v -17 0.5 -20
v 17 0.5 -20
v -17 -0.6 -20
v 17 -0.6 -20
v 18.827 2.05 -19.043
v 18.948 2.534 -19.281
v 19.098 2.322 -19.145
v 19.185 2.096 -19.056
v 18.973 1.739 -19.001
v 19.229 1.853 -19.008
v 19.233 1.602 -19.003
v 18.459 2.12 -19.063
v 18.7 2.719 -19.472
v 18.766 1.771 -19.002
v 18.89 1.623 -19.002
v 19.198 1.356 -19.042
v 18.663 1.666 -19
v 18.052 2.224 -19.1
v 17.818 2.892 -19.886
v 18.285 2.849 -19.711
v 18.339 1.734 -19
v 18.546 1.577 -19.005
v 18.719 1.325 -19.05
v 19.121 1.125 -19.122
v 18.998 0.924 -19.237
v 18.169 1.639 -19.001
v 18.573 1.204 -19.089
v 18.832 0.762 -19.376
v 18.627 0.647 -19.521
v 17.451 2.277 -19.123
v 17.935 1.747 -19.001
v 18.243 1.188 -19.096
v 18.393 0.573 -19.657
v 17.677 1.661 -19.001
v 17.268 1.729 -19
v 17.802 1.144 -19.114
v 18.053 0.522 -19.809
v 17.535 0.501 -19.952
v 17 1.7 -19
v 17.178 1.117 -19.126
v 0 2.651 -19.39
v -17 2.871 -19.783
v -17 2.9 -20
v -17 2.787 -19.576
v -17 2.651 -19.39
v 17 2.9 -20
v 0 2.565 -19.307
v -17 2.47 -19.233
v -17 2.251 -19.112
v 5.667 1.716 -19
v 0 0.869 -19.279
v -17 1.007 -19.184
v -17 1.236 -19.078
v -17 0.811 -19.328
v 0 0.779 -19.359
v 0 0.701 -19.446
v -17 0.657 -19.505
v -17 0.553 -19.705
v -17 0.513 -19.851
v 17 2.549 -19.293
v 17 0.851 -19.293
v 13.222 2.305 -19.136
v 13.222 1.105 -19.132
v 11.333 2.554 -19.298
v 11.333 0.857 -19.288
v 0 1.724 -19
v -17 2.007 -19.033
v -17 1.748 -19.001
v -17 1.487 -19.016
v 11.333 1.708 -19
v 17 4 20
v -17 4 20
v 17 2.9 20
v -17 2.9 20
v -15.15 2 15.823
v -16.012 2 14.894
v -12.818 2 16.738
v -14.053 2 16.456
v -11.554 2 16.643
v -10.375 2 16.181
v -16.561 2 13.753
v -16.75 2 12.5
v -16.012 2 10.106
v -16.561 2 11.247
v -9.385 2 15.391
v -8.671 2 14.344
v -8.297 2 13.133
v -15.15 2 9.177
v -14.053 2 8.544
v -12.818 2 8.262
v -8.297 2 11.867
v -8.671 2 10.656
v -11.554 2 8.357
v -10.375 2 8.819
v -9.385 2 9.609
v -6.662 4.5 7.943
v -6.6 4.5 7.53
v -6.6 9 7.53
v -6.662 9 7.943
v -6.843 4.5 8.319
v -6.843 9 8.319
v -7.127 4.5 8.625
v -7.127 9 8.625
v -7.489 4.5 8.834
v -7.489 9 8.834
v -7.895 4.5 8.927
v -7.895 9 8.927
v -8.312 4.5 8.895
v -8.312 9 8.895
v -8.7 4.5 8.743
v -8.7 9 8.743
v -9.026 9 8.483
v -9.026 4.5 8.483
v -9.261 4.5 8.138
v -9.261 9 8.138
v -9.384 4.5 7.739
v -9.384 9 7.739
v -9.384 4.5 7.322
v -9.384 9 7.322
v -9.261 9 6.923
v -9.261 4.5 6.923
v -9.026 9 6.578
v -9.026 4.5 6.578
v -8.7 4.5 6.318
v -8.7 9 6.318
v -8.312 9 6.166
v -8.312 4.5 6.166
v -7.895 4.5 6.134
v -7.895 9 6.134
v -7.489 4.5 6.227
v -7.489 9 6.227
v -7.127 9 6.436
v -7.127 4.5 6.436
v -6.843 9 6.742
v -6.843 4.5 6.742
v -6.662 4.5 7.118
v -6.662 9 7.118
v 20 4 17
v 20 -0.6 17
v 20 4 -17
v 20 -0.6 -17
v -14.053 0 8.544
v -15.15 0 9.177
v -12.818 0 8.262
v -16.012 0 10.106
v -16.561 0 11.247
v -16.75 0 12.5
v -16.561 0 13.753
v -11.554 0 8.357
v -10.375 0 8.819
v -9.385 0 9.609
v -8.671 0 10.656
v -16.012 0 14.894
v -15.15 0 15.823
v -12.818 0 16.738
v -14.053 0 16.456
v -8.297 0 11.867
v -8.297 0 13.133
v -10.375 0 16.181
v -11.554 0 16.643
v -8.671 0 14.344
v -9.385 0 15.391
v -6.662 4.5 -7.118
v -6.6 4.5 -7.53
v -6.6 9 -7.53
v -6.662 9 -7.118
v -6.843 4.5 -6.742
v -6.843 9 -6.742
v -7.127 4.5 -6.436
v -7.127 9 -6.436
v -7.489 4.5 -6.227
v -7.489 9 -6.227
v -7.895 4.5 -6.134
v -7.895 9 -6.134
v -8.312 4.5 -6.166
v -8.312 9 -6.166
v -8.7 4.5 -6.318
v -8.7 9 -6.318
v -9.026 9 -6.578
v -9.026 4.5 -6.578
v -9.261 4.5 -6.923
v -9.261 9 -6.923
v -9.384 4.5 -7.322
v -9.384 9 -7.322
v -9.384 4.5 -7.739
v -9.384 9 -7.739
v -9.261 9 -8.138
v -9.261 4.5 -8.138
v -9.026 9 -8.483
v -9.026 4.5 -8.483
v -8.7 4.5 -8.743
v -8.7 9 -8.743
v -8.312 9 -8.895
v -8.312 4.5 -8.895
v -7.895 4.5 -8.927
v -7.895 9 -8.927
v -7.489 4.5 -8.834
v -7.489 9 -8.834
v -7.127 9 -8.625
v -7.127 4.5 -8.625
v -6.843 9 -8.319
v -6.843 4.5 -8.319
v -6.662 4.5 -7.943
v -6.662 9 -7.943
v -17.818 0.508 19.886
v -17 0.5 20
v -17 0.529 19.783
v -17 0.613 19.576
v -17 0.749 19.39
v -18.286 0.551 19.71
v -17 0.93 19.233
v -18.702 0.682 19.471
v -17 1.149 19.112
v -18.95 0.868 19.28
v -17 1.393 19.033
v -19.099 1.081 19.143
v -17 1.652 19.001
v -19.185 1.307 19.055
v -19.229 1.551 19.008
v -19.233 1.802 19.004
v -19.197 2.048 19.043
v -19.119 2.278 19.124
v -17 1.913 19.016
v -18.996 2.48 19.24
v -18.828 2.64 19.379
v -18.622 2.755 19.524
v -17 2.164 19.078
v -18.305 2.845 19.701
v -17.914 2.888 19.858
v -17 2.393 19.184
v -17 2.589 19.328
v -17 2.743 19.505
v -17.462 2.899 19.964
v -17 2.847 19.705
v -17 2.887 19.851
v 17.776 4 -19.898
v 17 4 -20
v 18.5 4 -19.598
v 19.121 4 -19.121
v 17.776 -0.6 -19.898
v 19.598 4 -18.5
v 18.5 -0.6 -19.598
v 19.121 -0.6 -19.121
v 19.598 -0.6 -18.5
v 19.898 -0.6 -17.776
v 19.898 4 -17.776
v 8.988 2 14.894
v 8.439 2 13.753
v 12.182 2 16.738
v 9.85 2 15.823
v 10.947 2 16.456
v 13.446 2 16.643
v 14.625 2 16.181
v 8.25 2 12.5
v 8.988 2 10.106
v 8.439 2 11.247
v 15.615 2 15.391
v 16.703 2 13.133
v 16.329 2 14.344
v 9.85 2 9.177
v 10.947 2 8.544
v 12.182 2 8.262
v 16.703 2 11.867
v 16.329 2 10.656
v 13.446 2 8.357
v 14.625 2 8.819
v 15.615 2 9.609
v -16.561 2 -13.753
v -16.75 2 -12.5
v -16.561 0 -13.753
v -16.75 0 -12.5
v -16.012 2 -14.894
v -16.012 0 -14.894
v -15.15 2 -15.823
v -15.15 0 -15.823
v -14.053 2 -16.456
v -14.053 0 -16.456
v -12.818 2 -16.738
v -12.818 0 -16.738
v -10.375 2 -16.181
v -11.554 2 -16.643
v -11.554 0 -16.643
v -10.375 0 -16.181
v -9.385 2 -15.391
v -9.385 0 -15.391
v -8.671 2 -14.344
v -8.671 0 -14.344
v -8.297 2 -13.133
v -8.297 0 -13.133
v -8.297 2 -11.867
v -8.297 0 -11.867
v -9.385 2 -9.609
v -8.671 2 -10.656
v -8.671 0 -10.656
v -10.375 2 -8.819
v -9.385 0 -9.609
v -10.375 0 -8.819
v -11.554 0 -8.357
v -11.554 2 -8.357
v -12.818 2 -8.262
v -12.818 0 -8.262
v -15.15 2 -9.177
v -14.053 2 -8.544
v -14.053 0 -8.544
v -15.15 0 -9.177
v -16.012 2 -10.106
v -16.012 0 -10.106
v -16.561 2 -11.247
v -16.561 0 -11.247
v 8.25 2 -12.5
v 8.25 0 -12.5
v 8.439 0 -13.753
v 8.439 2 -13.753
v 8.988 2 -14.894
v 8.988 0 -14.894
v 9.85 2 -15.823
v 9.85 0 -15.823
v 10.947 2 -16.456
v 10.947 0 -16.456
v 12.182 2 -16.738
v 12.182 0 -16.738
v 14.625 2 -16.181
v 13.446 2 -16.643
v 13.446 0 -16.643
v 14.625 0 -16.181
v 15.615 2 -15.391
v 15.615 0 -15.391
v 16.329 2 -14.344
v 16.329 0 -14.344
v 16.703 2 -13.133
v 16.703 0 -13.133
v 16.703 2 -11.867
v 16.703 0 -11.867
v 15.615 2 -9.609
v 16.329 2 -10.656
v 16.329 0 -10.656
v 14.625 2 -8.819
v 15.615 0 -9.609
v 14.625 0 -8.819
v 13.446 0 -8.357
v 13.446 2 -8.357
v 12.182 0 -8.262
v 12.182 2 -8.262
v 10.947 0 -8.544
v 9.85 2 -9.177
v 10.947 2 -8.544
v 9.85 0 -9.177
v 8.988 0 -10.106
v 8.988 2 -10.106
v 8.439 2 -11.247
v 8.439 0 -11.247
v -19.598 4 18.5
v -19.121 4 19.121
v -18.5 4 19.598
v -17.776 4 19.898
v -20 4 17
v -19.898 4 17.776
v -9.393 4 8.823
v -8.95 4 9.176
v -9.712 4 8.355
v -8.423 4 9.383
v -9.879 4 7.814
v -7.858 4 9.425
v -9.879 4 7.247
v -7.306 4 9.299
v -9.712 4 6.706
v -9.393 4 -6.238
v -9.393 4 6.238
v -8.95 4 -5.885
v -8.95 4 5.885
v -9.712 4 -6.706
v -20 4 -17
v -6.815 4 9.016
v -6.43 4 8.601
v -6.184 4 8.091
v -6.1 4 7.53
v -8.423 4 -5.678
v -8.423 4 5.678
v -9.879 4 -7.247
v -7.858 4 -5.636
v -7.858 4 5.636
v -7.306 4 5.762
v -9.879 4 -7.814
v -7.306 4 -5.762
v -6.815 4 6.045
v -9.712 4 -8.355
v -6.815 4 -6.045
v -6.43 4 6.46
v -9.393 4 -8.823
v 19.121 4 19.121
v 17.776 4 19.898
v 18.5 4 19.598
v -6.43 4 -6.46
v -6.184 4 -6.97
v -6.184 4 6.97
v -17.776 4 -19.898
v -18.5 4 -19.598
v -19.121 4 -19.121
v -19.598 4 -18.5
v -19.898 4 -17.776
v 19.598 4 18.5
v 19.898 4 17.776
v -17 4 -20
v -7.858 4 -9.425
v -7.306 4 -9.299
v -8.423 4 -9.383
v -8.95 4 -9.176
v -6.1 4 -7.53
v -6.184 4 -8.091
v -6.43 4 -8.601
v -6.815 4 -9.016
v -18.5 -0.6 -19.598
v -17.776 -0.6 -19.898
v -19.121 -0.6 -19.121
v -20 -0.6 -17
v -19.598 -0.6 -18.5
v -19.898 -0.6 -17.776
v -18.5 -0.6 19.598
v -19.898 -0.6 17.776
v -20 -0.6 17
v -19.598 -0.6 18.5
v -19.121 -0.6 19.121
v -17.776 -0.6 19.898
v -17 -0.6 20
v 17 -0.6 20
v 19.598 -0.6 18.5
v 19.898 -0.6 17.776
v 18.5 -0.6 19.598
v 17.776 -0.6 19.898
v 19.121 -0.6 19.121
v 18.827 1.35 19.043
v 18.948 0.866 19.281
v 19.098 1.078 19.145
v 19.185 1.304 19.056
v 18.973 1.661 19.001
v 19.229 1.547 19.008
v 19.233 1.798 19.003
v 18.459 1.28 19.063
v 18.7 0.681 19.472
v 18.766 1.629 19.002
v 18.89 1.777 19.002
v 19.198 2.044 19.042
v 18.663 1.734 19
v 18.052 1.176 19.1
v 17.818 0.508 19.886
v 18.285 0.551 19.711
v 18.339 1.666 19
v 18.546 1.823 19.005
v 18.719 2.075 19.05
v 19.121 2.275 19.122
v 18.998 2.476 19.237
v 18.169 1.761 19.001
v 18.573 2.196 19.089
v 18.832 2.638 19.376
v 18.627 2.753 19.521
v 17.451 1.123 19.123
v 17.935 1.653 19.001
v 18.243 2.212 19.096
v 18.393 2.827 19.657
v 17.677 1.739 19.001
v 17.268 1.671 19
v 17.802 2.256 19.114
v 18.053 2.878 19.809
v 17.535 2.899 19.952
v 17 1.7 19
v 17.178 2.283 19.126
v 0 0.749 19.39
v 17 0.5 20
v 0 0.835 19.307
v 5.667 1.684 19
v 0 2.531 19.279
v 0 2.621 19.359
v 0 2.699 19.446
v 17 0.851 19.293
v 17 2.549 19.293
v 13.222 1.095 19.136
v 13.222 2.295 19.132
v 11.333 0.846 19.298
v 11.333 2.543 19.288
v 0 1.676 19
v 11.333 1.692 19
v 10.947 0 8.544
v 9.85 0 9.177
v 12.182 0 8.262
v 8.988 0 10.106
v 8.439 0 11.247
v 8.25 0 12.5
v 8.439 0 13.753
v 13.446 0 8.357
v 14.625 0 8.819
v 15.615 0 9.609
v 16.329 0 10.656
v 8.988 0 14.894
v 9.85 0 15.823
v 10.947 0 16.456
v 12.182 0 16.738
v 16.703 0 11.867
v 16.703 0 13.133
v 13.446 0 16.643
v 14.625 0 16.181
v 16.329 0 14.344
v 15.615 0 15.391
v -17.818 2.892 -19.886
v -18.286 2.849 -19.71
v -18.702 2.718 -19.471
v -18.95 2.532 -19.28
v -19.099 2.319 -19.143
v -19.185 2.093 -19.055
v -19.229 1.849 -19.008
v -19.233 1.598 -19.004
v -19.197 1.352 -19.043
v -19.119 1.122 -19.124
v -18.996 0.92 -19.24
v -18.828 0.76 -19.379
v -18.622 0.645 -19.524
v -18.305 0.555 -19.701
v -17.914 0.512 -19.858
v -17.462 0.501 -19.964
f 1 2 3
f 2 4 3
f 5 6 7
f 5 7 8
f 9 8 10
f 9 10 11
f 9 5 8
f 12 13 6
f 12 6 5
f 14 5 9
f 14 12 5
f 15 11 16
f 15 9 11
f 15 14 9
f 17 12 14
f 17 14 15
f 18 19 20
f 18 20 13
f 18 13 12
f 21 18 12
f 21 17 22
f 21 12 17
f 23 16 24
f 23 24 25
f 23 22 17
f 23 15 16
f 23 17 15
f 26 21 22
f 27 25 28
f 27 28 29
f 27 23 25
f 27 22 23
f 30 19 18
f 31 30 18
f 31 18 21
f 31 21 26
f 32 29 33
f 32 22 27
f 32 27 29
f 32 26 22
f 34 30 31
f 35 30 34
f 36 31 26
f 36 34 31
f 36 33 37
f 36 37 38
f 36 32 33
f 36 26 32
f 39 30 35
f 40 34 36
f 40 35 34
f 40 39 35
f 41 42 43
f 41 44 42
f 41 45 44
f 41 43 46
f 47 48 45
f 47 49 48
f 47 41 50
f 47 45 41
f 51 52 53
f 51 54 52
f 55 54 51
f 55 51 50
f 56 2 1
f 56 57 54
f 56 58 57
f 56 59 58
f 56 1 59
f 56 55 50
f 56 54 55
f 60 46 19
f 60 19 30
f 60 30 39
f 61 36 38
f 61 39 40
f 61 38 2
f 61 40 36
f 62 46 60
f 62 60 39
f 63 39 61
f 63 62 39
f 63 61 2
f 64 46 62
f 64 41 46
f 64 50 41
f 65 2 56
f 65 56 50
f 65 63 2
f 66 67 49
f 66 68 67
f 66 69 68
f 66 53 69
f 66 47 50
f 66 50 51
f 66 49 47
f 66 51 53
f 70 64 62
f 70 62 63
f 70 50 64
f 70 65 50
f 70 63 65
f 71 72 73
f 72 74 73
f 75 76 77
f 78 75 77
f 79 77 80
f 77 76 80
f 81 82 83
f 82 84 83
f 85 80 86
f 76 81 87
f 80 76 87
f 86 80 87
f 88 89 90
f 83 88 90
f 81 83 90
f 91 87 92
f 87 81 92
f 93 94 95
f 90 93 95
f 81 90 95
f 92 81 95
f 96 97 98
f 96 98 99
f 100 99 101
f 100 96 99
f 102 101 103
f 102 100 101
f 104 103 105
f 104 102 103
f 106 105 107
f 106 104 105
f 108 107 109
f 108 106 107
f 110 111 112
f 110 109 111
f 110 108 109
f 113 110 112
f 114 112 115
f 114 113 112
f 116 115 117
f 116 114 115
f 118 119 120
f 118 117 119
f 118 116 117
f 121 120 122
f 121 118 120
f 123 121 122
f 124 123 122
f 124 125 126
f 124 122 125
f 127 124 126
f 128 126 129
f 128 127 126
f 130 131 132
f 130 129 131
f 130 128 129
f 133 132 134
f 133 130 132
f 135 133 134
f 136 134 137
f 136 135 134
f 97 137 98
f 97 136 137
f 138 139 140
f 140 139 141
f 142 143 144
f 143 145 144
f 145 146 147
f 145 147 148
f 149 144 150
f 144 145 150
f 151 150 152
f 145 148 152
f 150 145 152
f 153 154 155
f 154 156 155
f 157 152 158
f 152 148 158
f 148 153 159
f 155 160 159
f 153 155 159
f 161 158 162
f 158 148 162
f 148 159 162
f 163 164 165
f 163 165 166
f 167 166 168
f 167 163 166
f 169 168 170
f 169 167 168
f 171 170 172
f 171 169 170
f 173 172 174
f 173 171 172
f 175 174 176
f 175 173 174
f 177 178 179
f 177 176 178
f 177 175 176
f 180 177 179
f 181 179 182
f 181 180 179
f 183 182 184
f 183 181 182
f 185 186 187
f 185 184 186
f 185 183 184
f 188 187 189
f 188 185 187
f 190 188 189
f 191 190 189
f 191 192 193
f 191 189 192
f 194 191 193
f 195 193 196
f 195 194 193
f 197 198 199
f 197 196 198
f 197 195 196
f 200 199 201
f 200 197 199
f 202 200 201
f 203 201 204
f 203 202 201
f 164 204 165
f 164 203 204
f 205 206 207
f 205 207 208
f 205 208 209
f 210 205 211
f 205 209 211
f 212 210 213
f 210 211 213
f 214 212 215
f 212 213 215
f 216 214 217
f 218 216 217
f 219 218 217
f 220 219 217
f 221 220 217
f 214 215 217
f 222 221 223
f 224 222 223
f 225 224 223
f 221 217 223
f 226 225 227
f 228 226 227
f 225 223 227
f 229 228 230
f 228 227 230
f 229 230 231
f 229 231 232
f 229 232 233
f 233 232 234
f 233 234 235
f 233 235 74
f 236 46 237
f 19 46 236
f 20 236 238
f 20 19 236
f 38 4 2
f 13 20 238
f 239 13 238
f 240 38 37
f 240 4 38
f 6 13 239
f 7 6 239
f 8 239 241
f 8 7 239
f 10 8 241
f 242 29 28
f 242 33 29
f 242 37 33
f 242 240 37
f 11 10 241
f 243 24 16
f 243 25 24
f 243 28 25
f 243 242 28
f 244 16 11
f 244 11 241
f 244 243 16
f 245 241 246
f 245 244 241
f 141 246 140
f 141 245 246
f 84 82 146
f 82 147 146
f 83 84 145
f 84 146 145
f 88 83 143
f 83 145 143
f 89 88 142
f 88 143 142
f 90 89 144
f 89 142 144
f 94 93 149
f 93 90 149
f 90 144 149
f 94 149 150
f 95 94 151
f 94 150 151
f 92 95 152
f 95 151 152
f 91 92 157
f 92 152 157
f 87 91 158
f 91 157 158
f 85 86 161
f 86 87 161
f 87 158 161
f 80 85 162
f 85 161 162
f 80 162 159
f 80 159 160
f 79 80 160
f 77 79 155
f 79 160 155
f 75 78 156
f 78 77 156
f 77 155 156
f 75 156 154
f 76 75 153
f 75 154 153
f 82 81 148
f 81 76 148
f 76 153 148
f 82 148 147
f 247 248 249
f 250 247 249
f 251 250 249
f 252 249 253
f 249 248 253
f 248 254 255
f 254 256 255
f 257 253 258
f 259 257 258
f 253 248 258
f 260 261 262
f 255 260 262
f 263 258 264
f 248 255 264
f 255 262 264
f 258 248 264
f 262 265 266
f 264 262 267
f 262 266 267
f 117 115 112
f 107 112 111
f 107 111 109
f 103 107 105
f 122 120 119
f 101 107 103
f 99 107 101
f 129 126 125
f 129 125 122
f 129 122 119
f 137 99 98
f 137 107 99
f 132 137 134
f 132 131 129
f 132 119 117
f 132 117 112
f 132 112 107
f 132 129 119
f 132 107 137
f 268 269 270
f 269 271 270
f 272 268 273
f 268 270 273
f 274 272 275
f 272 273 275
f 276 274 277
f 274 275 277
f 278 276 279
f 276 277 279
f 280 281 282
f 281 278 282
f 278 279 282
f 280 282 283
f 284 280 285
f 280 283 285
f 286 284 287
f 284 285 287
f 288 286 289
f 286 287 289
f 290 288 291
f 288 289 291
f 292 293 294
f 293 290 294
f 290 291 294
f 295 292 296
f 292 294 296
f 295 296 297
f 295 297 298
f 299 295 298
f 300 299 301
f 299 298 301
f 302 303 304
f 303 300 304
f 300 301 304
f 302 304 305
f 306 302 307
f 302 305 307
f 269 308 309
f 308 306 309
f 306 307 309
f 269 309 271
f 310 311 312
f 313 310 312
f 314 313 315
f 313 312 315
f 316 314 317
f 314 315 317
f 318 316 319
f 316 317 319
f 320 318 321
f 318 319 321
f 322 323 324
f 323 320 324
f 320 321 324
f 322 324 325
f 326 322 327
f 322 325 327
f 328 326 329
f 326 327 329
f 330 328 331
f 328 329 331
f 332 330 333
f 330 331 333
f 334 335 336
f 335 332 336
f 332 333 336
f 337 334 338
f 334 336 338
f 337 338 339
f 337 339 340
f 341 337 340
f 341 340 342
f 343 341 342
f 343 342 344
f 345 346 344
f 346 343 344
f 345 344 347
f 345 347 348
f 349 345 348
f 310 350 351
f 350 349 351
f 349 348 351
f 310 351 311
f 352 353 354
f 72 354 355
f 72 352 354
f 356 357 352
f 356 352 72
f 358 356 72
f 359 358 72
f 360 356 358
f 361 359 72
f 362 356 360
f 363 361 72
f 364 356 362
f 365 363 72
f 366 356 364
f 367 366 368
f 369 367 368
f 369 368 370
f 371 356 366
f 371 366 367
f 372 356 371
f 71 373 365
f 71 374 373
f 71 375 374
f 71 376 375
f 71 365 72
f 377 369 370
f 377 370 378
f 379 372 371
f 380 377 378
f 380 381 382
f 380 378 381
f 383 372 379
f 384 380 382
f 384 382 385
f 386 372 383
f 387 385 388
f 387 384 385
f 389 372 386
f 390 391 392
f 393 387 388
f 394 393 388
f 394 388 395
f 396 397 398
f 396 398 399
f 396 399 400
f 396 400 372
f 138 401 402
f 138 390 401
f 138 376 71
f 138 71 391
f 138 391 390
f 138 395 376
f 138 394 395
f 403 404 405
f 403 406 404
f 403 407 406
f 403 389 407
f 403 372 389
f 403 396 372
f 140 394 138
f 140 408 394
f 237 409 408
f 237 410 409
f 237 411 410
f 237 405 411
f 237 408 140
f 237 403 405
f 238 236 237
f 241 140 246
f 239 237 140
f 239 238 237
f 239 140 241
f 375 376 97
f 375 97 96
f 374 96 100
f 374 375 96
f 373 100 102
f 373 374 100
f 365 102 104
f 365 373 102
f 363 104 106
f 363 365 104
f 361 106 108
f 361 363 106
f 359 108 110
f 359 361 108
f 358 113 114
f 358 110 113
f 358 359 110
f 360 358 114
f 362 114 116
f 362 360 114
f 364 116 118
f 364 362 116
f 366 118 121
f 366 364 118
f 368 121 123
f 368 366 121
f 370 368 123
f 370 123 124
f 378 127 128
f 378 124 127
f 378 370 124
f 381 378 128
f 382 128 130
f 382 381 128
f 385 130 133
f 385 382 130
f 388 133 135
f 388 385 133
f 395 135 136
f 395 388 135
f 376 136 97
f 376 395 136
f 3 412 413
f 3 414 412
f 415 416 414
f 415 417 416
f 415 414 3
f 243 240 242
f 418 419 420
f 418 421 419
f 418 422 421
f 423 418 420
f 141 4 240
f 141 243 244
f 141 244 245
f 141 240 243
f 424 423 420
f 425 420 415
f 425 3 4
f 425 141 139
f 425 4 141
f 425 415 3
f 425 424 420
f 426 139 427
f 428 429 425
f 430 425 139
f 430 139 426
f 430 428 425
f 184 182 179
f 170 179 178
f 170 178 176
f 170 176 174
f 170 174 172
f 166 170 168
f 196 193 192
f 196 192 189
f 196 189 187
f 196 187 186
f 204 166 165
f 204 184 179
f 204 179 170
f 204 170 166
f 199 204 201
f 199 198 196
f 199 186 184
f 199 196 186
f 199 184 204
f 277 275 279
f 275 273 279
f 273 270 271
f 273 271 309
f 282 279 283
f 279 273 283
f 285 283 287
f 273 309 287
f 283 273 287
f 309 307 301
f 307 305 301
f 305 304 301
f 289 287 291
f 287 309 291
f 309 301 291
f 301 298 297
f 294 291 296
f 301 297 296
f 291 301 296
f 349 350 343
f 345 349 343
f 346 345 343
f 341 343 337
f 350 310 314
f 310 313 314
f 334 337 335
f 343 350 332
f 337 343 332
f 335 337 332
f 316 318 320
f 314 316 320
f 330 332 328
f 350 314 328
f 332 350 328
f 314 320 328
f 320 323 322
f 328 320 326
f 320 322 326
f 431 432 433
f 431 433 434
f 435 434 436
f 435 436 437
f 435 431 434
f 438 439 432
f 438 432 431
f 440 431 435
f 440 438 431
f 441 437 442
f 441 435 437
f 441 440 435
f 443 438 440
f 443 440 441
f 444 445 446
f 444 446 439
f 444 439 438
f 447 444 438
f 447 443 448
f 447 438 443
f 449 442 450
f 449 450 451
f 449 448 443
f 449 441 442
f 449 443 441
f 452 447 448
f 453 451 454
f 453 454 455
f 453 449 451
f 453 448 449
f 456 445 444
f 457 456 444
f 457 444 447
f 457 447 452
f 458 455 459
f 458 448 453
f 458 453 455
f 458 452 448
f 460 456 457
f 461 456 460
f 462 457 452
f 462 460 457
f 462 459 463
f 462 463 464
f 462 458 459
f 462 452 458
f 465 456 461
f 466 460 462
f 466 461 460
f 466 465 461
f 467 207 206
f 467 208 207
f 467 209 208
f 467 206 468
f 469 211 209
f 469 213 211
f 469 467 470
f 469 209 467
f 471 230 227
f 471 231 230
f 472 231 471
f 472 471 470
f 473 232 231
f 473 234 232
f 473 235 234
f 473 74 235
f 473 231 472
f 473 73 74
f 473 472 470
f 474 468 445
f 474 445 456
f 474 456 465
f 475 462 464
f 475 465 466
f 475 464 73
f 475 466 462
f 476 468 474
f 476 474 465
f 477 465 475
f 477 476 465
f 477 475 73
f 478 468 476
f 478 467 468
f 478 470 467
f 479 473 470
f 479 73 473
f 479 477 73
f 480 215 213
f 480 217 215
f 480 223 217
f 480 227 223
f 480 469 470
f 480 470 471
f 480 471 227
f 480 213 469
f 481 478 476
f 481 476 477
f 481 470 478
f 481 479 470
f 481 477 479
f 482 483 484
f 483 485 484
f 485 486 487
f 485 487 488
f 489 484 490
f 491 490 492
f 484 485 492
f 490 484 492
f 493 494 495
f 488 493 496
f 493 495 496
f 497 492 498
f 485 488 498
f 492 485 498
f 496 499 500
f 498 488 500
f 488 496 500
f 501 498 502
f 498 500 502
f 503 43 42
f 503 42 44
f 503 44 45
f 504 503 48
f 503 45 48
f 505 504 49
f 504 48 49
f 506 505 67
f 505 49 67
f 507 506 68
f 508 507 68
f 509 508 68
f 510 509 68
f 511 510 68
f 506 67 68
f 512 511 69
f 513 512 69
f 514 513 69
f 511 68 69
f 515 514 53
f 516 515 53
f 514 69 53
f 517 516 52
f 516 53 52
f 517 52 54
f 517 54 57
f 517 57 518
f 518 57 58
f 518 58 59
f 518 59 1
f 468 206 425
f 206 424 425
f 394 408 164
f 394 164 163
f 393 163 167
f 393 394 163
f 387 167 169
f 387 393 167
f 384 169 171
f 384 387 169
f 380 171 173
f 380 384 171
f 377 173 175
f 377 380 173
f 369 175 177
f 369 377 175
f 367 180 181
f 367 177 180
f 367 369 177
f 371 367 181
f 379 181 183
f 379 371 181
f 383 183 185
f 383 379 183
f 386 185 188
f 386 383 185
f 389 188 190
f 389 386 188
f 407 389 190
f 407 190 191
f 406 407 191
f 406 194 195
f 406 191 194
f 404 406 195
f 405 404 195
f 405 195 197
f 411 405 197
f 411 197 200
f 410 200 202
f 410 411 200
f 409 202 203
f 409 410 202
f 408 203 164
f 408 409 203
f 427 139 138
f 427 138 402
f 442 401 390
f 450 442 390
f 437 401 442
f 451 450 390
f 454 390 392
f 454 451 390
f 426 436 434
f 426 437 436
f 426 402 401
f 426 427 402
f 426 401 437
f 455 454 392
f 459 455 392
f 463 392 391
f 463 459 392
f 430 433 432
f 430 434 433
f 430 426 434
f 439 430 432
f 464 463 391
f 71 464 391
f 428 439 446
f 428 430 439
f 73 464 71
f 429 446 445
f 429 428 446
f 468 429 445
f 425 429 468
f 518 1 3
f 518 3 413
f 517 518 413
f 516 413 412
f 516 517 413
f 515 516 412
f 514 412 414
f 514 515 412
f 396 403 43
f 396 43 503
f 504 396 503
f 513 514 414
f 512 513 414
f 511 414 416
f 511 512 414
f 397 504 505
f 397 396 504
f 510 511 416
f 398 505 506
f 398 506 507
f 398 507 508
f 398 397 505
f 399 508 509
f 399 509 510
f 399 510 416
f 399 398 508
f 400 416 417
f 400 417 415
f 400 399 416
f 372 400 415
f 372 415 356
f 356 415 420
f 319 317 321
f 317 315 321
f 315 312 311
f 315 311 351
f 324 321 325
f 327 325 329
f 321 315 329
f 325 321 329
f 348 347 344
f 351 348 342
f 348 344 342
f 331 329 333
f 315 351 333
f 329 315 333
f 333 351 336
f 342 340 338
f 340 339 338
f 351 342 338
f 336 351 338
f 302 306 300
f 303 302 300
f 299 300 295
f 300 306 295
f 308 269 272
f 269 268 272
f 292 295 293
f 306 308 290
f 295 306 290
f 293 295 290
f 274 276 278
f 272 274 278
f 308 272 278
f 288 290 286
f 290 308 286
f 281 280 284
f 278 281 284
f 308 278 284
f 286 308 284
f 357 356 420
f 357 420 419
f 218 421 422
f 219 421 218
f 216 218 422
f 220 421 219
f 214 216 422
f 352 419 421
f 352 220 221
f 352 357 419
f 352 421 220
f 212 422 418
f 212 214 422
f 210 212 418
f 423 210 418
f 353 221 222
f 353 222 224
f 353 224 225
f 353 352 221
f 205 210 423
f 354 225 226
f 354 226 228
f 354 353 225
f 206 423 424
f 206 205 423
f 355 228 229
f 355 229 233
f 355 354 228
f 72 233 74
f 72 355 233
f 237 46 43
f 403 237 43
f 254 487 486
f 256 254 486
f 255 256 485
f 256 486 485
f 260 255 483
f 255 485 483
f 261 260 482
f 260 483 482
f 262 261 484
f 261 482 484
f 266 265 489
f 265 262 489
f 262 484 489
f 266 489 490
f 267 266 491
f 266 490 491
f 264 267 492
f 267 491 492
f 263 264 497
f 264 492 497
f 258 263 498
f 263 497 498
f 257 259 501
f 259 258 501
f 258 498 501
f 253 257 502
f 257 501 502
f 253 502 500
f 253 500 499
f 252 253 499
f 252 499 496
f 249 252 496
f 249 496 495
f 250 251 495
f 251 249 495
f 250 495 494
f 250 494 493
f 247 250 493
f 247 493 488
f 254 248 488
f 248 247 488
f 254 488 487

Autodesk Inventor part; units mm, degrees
ref_plane "YZ Plane" through (0, 0, 0) normal (1, 0, 0) x (0, 1, 0)
ref_plane "XZ Plane" through (0, 0, 0) normal (0, 1, 0) x (-1, 0, 0)
sketch "Sketch1" plane through (0, 0, 0) normal (0, 1, 0) x (-1, 0, 0)
  line L0 (20, 20) -> (-20, 20)
  line L1 (-20, 20) -> (-20, -20)
  line L2 (-20, -20) -> (20, -20)
  line L3 (20, -20) -> (20, 20)
  circle A0 centre (12.5, 12.5) radius 4.25
  circle A1 centre (12.5, -12.5) radius 4.25
  circle A2 centre (-12.5, -12.5) radius 4.25
  circle A3 centre (-12.5, 12.5) radius 4.25
  line L4 (20, 0) -> (-20, 0) construction
  line L5 (0, 20) -> (0, -20) construction
  point P0 (0, 0)
  dimension "d0" = 40
  dimension "d1" = 40
  dimension "d2" = 8.5
  dimension "d3" = 25
  dimension "d4" = 25
extrude "Extrusion2" add sketch "Sketch1" along normal blind 2
sketch "Sketch2" plane through (0, 0, 0) normal (0, -1, 0) x (1, 0, 0)
  line L0 (20, 20) -> (20, -20) projected
  line L1 (-20, 20) -> (20, 20) projected
  line L2 (-20, -20) -> (-20, 20) projected
  line L3 (20, -20) -> (-20, -20) projected
  point P0 (0, 0)
extrude "Extrusion3" add sketch "Sketch2" along normal blind 0.6
sketch "Sketch3" plane through (0, 2, 0) normal (0, 1, 0) x (1, 0, 0)
  line L0 (-20, 20) -> (-20, -20) projected
  line L1 (-20, -20) -> (20, -20) projected
  line L2 (20, -20) -> (20, 20) projected
  line L3 (20, 20) -> (-20, 20) projected
  point P0 (0, 0)
extrude "Extrusion4" add sketch "Sketch3" along normal blind 2
sketch "Sketch4" plane through (0, 4, 0) normal (0, 1, 0) x (1, 0, 0)
  circle A0 centre (-8, -7.5305) radius 1.4
  circle A1 centre (-8, 7.5305) radius 1.4
  line L0 (-20, -20) -> (-20, 20) projected
  line L1 (-20, 0) -> (20, 0) construction
  line L2 (20, 20) -> (20, -20) projected
  point P0 (0, 0)
  dimension "d13" = 15.061
  dimension "d14" = 2.8
  dimension "d15" = 12
extrude "Extrusion5" add sketch "Sketch4" along normal blind 5
chamfer "Chamfer1" distance 0.5 angle 45 2 edges at (-9.4, 4, 7.5305) (-9.4, 4, -7.5305)
fillet "Fillet1" radius 3 4 edges at (-20, 1.7, 20) (-20, 1.7, -20) (20, 1.7, 20) (20, 1.7, -20)
ref_plane "Arbeitsebene1" through (-17, 4, 20) normal (1, 0, 0) x (0, -1, 0)
sketch "Skizze5" plane through (-17, 4, 20) normal (1, 0, 0) x (0, -1, 0)
  line L0 (0, 0) -> (4.6, 0) construction
  line L1 (0, 0) -> (0, 3) construction
  line L2 (0.7, 0) -> (3.5, 0) construction
  line L3 (6.1491, 20) -> (-1.642, 20) construction
  line L4 (0, 40) -> (4.6, 40) construction
  line L5 (0.7, 40) -> (3.5, 40) construction
  line L6 (2.3, 0) -> (2.3, 4.6722) construction
  ellipse E0 centre (2.3, 0) end of major axis (3.5, 0) minor radius 1
  line L7 (1.1, 0) -> (3.5, 0)
  line L8 (0, 40) -> (4.6, 40) construction
  line L9 (0.7, 40) -> (3.5, 40) construction
  ellipse E1 centre (2.3, 40) end of major axis (3.5, 40) minor radius 1
  line L10 (1.1, 40) -> (3.5, 40)
  point P0 (4, 20)
  point P1 (2.3, 1)
  dimension "d22" = 2.3
  dimension "d23" = 1.2
  dimension "d28" = 1
extrude "Extrusion7" cut sketch "Skizze5" along normal blind 37 and the other way blind 5 contours L7 E0 | E1 L10 picked at (2.3176, 0.333) picked at (2.2824, 39.667)
properties part number "IMU_mount_baseplate"
